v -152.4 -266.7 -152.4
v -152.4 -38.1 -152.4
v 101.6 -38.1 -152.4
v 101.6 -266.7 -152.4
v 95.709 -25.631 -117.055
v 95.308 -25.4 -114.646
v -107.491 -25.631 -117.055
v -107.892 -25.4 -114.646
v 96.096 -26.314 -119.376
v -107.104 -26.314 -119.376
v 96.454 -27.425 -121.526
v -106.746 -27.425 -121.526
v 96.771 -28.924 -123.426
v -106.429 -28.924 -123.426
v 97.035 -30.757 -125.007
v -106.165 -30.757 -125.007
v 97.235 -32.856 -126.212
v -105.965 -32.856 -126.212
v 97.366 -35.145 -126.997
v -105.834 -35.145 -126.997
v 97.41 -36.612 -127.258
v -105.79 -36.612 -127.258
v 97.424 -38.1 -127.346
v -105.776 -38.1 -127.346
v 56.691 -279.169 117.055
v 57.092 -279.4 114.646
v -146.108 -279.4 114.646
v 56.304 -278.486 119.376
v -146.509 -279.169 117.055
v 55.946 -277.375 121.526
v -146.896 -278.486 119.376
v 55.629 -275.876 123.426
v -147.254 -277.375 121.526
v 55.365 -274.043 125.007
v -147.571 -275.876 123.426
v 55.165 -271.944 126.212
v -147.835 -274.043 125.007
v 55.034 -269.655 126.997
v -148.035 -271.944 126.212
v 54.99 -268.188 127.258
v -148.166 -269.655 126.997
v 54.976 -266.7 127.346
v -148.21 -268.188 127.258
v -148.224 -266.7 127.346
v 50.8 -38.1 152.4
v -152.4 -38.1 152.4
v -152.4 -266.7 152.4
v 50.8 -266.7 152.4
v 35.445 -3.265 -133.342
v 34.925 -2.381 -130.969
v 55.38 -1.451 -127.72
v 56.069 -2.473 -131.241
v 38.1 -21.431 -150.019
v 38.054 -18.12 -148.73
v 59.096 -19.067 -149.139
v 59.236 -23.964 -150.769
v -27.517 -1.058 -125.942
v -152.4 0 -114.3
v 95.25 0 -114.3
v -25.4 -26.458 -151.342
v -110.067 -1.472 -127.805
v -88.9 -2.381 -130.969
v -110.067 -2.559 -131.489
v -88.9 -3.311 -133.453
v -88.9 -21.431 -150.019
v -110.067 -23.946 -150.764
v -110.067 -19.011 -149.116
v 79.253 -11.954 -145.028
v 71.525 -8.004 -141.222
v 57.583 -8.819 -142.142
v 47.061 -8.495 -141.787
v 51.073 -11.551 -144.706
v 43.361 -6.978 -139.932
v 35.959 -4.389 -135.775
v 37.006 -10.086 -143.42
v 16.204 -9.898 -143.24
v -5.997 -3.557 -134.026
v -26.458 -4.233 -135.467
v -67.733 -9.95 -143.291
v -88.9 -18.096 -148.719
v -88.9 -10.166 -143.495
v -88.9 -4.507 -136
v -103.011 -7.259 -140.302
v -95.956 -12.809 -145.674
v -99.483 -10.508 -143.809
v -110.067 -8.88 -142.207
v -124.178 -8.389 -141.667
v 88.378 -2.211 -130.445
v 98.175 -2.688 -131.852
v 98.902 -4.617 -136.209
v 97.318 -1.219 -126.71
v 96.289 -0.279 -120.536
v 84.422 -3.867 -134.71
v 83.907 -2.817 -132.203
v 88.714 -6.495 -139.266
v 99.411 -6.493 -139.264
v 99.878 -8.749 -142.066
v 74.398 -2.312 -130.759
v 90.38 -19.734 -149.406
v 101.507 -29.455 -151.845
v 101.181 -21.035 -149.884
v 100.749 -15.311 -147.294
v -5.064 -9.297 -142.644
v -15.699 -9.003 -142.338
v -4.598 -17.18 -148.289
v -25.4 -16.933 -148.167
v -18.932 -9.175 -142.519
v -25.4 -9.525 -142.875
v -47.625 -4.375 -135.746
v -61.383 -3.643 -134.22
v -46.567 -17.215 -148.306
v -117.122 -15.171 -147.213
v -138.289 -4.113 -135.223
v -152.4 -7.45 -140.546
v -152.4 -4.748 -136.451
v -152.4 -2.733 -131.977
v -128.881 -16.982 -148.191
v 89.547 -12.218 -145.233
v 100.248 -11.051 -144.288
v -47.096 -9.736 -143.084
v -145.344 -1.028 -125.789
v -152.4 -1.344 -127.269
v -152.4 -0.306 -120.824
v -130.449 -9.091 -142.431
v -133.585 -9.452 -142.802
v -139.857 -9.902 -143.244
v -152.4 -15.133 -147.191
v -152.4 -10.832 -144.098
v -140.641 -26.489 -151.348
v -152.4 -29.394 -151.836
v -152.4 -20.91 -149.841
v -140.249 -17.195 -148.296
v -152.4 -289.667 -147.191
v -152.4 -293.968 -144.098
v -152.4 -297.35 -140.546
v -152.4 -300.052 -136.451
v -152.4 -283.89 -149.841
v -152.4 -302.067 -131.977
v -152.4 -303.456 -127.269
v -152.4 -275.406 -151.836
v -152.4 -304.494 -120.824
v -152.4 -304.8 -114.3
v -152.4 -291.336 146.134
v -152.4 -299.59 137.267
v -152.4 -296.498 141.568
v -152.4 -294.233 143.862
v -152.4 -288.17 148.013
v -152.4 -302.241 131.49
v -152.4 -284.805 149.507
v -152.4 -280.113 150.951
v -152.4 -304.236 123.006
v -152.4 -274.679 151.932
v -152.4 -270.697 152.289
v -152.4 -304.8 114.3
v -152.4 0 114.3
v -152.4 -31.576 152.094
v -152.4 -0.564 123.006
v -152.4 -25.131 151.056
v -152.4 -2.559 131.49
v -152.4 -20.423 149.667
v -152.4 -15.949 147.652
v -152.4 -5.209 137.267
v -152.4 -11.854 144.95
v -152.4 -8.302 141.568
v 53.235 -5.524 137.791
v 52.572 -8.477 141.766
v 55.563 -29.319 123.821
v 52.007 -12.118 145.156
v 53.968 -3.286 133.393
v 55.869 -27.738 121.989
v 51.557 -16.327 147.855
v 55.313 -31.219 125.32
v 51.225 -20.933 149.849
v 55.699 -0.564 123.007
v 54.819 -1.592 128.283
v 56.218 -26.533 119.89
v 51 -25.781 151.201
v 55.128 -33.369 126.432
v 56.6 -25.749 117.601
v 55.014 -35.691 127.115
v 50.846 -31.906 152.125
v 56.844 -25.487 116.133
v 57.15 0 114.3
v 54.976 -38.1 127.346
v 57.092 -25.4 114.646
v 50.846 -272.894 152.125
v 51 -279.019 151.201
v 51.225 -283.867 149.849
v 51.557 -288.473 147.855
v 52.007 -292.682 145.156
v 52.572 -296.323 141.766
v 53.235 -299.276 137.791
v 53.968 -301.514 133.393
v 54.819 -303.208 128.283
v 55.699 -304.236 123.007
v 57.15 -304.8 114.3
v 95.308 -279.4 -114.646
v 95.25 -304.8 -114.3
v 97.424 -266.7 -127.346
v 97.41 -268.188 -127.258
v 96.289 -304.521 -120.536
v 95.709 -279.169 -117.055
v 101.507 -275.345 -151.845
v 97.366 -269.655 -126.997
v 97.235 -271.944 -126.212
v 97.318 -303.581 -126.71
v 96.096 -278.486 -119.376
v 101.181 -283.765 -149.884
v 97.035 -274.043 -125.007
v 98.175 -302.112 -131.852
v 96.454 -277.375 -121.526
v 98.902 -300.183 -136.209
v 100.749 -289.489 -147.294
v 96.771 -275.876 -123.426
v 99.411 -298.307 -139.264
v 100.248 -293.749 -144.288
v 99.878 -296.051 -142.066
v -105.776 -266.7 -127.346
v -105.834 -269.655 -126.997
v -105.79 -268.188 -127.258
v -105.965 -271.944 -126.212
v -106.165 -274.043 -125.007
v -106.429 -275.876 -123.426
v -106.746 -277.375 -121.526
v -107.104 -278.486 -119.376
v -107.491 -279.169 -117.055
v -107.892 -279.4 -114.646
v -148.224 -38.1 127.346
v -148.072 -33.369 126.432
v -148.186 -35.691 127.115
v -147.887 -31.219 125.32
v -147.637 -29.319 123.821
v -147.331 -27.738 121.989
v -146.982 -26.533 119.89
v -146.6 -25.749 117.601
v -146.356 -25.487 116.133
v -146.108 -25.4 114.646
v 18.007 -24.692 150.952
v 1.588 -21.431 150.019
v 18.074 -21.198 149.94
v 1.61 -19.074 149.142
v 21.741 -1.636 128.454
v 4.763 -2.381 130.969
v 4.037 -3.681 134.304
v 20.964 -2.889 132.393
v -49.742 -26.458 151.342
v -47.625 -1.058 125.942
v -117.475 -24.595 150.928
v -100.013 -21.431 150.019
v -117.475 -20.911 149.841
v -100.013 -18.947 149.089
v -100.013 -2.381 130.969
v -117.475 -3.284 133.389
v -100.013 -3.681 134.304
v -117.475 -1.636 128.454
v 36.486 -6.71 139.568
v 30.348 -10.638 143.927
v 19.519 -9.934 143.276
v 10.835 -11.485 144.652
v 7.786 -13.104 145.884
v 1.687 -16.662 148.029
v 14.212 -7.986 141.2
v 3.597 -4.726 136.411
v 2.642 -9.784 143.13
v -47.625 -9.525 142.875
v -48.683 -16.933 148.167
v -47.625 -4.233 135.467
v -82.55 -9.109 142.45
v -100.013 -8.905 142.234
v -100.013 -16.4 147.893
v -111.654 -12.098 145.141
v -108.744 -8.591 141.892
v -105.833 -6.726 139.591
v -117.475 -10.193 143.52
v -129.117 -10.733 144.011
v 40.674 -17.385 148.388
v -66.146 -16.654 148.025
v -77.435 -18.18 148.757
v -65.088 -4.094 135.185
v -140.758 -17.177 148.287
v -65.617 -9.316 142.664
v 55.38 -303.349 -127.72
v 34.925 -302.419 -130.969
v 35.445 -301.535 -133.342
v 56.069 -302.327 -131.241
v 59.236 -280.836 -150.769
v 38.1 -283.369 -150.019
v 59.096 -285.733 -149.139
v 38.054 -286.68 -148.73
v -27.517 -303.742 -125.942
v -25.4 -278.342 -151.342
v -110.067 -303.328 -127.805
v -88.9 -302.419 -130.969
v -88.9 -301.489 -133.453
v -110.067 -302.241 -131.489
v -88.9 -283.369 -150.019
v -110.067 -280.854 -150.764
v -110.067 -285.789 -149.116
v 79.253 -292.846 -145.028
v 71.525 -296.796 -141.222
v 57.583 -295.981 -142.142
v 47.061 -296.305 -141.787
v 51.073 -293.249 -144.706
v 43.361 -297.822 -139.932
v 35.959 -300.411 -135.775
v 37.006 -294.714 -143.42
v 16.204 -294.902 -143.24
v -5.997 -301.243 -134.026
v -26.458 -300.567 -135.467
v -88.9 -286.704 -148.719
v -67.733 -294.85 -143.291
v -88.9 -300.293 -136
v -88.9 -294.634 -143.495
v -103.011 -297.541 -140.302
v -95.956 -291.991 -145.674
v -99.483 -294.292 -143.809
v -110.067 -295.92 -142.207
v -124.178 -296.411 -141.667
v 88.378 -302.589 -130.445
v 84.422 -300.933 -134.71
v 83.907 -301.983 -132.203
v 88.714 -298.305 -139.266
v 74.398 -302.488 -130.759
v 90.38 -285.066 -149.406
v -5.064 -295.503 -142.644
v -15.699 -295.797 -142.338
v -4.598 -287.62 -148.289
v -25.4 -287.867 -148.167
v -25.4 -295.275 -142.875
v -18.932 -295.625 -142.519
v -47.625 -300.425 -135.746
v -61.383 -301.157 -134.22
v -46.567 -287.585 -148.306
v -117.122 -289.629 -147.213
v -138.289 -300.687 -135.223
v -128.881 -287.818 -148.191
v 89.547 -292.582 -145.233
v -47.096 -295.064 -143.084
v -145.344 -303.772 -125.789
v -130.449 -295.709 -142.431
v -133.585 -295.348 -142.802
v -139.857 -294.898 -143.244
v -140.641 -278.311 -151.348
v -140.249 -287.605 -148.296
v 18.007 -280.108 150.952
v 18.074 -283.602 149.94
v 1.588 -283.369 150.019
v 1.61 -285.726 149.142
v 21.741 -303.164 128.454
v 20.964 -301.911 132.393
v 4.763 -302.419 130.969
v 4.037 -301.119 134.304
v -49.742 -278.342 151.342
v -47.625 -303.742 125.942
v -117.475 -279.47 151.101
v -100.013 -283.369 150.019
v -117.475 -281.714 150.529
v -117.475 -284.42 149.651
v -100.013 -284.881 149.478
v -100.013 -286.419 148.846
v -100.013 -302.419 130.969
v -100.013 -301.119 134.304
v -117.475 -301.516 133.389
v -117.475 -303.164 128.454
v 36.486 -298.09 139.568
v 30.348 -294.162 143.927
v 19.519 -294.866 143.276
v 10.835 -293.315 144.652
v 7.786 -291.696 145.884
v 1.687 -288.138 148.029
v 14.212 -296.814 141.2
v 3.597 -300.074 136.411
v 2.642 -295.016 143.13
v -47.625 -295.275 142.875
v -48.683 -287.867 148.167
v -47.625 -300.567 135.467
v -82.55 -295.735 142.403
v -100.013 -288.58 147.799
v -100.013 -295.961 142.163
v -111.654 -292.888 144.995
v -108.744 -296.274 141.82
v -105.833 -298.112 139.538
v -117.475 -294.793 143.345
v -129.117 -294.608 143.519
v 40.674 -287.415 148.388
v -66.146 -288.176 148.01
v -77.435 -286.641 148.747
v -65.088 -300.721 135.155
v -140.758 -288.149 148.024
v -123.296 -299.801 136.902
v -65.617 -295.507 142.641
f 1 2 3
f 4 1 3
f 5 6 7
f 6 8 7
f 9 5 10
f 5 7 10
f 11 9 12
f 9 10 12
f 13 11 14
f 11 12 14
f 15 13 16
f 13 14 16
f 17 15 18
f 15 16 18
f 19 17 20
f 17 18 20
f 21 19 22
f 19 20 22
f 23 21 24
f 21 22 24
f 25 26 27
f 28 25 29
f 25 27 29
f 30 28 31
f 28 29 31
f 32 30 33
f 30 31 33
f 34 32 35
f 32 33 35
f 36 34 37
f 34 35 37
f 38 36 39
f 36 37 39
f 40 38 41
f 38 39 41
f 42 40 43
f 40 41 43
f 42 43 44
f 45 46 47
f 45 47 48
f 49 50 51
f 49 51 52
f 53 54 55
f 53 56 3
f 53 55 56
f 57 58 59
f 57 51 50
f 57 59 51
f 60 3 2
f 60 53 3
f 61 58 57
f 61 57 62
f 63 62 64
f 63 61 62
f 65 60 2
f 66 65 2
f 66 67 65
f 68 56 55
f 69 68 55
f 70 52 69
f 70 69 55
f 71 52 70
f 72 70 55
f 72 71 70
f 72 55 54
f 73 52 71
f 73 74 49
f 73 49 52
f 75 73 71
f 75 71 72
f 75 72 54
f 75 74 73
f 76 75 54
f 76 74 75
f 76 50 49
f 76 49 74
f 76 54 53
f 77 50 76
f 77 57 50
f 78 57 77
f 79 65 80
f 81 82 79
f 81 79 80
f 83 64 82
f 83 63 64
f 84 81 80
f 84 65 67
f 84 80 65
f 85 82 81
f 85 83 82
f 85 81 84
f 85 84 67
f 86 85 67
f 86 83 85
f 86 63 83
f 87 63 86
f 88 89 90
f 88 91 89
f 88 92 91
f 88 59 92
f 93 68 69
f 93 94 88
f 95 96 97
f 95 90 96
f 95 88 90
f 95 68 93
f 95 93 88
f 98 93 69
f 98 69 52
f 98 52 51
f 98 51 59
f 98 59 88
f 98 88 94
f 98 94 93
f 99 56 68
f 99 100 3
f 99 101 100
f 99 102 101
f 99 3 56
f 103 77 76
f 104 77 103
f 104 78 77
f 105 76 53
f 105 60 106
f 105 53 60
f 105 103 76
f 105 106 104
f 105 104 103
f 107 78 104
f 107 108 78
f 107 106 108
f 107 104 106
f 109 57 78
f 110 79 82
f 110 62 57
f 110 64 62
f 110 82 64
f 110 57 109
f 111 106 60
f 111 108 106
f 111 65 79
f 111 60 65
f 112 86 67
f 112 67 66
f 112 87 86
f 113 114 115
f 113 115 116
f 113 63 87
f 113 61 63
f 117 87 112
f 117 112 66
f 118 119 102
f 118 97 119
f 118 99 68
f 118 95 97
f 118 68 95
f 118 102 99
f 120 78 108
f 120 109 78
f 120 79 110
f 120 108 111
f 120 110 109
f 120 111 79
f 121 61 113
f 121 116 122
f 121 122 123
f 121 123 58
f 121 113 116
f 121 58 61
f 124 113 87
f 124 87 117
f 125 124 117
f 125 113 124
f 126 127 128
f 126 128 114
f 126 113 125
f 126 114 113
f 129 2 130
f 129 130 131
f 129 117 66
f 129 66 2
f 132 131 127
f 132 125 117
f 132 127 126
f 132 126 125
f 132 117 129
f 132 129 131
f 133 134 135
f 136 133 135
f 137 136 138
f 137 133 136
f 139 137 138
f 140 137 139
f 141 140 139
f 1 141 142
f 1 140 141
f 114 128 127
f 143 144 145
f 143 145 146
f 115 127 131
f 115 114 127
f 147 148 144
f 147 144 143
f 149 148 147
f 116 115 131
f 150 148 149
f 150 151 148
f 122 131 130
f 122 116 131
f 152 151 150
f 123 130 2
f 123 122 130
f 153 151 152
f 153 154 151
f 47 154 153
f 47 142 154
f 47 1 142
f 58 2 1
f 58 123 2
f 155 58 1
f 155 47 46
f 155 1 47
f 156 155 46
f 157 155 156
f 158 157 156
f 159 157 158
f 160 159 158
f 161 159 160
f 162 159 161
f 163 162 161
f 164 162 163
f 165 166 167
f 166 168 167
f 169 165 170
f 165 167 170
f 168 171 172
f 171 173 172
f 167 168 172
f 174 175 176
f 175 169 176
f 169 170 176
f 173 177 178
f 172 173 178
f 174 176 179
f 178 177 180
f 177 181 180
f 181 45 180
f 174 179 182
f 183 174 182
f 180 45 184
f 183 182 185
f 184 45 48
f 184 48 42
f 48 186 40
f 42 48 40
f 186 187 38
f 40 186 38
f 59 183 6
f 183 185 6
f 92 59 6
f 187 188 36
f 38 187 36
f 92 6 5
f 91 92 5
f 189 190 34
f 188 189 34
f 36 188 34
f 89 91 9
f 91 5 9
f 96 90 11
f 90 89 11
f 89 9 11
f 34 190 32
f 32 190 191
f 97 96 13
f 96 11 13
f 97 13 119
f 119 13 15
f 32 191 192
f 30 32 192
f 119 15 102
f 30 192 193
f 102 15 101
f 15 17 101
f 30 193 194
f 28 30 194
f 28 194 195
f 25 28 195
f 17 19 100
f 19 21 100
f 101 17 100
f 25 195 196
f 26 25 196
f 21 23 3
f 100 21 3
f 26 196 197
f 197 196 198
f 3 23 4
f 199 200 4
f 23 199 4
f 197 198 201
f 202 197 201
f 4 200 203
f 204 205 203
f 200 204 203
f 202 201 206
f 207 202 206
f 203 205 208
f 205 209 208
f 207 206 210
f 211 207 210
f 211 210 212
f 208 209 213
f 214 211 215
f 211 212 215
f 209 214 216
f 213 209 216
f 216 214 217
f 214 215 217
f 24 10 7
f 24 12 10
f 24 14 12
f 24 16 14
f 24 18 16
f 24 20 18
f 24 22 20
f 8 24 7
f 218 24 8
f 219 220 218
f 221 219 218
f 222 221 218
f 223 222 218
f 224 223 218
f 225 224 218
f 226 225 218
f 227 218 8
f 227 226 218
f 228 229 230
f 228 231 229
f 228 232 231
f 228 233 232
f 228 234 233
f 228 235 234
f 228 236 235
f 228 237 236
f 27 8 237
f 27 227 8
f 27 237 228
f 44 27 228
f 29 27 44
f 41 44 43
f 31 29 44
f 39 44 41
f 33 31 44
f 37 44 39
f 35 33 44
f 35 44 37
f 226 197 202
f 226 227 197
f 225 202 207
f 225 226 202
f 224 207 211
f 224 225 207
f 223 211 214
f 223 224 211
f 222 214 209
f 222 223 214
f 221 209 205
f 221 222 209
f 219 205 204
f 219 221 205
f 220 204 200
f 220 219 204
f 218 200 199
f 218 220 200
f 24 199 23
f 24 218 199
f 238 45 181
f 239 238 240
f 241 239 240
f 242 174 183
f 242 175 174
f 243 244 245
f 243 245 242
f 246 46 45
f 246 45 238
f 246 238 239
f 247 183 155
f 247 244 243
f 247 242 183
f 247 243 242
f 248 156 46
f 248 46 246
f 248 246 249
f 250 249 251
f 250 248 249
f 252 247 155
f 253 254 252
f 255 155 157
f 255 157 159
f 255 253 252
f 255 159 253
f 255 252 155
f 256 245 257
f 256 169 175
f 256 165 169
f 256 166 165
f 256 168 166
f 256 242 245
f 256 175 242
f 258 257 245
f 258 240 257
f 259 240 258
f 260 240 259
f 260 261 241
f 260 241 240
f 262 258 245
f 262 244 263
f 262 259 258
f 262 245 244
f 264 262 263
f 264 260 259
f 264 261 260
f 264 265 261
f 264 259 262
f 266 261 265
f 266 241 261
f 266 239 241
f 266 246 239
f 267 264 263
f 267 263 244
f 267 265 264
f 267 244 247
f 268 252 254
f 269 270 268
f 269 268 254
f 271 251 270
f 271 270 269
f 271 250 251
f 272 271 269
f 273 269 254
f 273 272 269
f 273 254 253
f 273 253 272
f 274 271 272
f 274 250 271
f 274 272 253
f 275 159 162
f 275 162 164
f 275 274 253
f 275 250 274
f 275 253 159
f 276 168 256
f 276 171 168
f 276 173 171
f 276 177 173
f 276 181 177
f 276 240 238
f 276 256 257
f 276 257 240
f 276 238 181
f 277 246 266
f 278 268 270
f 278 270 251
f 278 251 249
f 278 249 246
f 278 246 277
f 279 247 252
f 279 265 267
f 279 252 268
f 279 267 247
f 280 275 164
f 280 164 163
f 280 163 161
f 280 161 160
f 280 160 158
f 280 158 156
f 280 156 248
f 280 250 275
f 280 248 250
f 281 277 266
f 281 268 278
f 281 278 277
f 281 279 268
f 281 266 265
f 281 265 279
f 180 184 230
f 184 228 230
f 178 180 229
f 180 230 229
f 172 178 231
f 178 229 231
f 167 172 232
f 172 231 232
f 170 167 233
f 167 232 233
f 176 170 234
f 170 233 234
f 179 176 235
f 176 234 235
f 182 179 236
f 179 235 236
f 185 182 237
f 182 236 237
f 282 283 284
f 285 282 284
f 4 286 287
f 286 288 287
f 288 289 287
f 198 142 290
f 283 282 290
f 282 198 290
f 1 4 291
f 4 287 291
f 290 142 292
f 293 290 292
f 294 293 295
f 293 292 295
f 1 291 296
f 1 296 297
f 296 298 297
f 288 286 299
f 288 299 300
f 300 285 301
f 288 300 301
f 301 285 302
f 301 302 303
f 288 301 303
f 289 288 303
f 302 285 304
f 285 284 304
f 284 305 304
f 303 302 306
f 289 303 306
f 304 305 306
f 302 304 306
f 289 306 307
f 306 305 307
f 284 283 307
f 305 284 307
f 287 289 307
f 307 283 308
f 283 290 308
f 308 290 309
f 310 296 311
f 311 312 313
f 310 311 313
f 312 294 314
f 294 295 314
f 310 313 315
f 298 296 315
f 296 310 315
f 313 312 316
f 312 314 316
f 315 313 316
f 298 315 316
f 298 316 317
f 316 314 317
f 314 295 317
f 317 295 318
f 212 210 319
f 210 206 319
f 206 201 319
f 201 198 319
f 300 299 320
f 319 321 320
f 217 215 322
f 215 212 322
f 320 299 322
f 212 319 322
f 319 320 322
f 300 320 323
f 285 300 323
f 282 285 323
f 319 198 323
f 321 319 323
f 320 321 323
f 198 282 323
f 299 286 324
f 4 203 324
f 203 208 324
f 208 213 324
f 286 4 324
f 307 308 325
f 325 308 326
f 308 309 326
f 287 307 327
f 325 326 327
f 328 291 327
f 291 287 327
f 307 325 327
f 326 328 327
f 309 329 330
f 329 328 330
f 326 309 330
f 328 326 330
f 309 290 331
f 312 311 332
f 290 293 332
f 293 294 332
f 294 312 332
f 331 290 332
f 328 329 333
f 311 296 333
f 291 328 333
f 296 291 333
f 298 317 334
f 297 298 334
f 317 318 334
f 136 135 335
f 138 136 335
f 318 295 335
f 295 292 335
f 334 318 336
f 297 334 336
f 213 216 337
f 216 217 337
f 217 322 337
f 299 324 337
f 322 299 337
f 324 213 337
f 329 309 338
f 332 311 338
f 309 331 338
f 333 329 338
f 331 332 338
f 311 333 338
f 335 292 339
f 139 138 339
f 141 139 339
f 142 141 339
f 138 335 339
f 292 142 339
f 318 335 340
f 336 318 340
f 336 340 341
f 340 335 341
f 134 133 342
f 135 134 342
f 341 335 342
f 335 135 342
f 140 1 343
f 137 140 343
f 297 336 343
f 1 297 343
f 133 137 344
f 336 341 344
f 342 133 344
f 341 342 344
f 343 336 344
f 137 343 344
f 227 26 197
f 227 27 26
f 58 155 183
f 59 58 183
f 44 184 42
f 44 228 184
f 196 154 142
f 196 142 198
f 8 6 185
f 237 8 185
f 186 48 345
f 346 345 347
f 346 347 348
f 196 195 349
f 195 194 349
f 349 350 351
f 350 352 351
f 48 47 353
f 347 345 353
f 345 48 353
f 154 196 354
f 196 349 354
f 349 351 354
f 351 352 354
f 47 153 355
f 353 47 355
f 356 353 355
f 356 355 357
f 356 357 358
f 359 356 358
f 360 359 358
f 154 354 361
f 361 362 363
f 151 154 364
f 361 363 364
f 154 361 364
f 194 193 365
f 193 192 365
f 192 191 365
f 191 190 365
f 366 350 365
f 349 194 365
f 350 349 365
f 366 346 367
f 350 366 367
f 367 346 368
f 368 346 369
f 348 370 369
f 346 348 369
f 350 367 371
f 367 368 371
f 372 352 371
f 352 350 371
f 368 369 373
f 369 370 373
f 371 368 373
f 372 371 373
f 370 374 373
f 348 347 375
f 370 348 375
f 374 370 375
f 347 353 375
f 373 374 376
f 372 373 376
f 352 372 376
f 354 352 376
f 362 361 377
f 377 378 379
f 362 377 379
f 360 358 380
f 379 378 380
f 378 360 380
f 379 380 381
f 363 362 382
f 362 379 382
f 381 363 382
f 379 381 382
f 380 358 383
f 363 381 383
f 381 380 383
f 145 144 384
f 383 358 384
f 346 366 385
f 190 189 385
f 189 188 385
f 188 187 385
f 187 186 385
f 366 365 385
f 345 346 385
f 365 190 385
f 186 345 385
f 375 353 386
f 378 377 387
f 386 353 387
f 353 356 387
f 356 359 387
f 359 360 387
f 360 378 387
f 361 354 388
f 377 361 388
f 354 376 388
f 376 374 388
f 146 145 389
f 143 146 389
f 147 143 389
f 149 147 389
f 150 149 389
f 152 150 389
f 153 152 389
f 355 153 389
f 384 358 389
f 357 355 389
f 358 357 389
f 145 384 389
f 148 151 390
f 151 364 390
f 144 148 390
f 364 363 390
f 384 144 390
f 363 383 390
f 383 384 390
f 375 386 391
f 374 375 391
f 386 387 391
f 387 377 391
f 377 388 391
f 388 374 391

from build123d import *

# Parameters (mm, degrees)
F0_W        = 304.8
F0_H        = 304.8
F1_DEPTH    = 304.8
F3_DEPTH    = 304.801
F4_T1_DEPTH = 393.7
F4_T3_DEPTH = 444.5
F5_W        = 254
F5_H        = 258.2043365391
F7_R        = 12.7


# Not quite as in the source:
# - a fillet or chamfer that OpenCascade refuses, or shapes differently, is made with other operations: its cross-section is extruded or revolved along the edge and cut away or added


with BuildPart() as f1:
    # F0 (on Front) → F1 (new body)
    with BuildSketch(Plane.XZ):
        Rectangle(F0_W, F0_H)
    extrude(amount=F1_DEPTH)

    # F2 (on face) → F3 (cut, through all)
    with BuildSketch(Plane.XZ.offset(304.8)):
        Polygon((152.4, 152.4), (50.8, 152.4), (101.6, -152.4), (152.4, -152.4), align=None)
    extrude(amount=-F3_DEPTH, mode=Mode.SUBTRACT)

    # F4: fillet of radius 38.1 on 4 edges, made by hand

    # F4_s2 → F4_t1 (cut)
    with BuildSketch(Plane.YZ.offset(-247.65)):
        with BuildLine():
            add(Edge.make_bspline(
                [(-266.7, 152.4), (-304.8, 152.4), (-304.8, 114.3)],
                knots=[0, 0, 0, 1, 1, 1], degree=2, weights=[1, 1, 1]))
            Line((-304.8, 114.3), (-304.8, 152.4))
            Line((-304.8, 152.4), (-266.7, 152.4))
        make_face()
        with BuildLine():
            add(Edge.make_bspline(
                [(-38.1, 152.4), (0, 152.4), (0, 114.3)],
                knots=[0, 0, 0, 1, 1, 1], degree=2, weights=[1, 1, 1]))
            Line((0, 114.3), (0, 152.4))
            Line((0, 152.4), (-38.1, 152.4))
        make_face()
    extrude(amount=F4_T1_DEPTH, mode=Mode.SUBTRACT)

    # F4_s4 → F4_t3 (cut)
    with BuildSketch(Plane.YZ.offset(-247.65)):
        with BuildLine():
            add(Edge.make_bspline(
                [(0, -114.3), (0, -152.4), (-38.1, -152.4)],
                knots=[0, 0, 0, 1, 1, 1], degree=2, weights=[1, 1, 1]))
            Line((-38.1, -152.4), (0, -152.4))
            Line((0, -152.4), (0, -114.3))
        make_face()
        with BuildLine():
            add(Edge.make_bspline(
                [(-304.8, -114.3), (-304.8, -152.4), (-266.7, -152.4)],
                knots=[0, 0, 0, 1, 1, 1], degree=2, weights=[1, 1, 1]))
            Line((-266.7, -152.4), (-304.8, -152.4))
            Line((-304.8, -152.4), (-304.8, -114.3))
        make_face()
    extrude(amount=F4_T3_DEPTH, mode=Mode.SUBTRACT)

    # F6: sweep along a path in F6_path
    with BuildLine(Plane(origin=(50.8, -266.7, 152.4), x_dir=(0, -1, 0), z_dir=(0, 0, -1))) as f6_path:
        Line((0, 0), (0, 203.2))
    # F5 (on face) → F6 (sweep, cut)
    with BuildSketch(Plane(origin=(74.1405405405, 0, 12.3567567568), x_dir=(0, 1, 0), z_dir=(0.9863939238, 0, 0.1643989873))):
        with Locations((-152.4, -12.5272028327)):
            Rectangle(F5_W, F5_H)
    sweep(path=f6_path.line, mode=Mode.SUBTRACT)

    # F7
    f7_edges = [f1.edges().sort_by_distance(p)[0] for p in [
        (-4.175734, -279.4, -127.345594),
        (-4.175734, -25.4, -127.345594),
        (-46.624266, -279.4, 127.345594),
        (-46.624266, -25.4, 127.345594),
    ]]
    fillet(f7_edges, radius=F7_R)


solid = f1.part
